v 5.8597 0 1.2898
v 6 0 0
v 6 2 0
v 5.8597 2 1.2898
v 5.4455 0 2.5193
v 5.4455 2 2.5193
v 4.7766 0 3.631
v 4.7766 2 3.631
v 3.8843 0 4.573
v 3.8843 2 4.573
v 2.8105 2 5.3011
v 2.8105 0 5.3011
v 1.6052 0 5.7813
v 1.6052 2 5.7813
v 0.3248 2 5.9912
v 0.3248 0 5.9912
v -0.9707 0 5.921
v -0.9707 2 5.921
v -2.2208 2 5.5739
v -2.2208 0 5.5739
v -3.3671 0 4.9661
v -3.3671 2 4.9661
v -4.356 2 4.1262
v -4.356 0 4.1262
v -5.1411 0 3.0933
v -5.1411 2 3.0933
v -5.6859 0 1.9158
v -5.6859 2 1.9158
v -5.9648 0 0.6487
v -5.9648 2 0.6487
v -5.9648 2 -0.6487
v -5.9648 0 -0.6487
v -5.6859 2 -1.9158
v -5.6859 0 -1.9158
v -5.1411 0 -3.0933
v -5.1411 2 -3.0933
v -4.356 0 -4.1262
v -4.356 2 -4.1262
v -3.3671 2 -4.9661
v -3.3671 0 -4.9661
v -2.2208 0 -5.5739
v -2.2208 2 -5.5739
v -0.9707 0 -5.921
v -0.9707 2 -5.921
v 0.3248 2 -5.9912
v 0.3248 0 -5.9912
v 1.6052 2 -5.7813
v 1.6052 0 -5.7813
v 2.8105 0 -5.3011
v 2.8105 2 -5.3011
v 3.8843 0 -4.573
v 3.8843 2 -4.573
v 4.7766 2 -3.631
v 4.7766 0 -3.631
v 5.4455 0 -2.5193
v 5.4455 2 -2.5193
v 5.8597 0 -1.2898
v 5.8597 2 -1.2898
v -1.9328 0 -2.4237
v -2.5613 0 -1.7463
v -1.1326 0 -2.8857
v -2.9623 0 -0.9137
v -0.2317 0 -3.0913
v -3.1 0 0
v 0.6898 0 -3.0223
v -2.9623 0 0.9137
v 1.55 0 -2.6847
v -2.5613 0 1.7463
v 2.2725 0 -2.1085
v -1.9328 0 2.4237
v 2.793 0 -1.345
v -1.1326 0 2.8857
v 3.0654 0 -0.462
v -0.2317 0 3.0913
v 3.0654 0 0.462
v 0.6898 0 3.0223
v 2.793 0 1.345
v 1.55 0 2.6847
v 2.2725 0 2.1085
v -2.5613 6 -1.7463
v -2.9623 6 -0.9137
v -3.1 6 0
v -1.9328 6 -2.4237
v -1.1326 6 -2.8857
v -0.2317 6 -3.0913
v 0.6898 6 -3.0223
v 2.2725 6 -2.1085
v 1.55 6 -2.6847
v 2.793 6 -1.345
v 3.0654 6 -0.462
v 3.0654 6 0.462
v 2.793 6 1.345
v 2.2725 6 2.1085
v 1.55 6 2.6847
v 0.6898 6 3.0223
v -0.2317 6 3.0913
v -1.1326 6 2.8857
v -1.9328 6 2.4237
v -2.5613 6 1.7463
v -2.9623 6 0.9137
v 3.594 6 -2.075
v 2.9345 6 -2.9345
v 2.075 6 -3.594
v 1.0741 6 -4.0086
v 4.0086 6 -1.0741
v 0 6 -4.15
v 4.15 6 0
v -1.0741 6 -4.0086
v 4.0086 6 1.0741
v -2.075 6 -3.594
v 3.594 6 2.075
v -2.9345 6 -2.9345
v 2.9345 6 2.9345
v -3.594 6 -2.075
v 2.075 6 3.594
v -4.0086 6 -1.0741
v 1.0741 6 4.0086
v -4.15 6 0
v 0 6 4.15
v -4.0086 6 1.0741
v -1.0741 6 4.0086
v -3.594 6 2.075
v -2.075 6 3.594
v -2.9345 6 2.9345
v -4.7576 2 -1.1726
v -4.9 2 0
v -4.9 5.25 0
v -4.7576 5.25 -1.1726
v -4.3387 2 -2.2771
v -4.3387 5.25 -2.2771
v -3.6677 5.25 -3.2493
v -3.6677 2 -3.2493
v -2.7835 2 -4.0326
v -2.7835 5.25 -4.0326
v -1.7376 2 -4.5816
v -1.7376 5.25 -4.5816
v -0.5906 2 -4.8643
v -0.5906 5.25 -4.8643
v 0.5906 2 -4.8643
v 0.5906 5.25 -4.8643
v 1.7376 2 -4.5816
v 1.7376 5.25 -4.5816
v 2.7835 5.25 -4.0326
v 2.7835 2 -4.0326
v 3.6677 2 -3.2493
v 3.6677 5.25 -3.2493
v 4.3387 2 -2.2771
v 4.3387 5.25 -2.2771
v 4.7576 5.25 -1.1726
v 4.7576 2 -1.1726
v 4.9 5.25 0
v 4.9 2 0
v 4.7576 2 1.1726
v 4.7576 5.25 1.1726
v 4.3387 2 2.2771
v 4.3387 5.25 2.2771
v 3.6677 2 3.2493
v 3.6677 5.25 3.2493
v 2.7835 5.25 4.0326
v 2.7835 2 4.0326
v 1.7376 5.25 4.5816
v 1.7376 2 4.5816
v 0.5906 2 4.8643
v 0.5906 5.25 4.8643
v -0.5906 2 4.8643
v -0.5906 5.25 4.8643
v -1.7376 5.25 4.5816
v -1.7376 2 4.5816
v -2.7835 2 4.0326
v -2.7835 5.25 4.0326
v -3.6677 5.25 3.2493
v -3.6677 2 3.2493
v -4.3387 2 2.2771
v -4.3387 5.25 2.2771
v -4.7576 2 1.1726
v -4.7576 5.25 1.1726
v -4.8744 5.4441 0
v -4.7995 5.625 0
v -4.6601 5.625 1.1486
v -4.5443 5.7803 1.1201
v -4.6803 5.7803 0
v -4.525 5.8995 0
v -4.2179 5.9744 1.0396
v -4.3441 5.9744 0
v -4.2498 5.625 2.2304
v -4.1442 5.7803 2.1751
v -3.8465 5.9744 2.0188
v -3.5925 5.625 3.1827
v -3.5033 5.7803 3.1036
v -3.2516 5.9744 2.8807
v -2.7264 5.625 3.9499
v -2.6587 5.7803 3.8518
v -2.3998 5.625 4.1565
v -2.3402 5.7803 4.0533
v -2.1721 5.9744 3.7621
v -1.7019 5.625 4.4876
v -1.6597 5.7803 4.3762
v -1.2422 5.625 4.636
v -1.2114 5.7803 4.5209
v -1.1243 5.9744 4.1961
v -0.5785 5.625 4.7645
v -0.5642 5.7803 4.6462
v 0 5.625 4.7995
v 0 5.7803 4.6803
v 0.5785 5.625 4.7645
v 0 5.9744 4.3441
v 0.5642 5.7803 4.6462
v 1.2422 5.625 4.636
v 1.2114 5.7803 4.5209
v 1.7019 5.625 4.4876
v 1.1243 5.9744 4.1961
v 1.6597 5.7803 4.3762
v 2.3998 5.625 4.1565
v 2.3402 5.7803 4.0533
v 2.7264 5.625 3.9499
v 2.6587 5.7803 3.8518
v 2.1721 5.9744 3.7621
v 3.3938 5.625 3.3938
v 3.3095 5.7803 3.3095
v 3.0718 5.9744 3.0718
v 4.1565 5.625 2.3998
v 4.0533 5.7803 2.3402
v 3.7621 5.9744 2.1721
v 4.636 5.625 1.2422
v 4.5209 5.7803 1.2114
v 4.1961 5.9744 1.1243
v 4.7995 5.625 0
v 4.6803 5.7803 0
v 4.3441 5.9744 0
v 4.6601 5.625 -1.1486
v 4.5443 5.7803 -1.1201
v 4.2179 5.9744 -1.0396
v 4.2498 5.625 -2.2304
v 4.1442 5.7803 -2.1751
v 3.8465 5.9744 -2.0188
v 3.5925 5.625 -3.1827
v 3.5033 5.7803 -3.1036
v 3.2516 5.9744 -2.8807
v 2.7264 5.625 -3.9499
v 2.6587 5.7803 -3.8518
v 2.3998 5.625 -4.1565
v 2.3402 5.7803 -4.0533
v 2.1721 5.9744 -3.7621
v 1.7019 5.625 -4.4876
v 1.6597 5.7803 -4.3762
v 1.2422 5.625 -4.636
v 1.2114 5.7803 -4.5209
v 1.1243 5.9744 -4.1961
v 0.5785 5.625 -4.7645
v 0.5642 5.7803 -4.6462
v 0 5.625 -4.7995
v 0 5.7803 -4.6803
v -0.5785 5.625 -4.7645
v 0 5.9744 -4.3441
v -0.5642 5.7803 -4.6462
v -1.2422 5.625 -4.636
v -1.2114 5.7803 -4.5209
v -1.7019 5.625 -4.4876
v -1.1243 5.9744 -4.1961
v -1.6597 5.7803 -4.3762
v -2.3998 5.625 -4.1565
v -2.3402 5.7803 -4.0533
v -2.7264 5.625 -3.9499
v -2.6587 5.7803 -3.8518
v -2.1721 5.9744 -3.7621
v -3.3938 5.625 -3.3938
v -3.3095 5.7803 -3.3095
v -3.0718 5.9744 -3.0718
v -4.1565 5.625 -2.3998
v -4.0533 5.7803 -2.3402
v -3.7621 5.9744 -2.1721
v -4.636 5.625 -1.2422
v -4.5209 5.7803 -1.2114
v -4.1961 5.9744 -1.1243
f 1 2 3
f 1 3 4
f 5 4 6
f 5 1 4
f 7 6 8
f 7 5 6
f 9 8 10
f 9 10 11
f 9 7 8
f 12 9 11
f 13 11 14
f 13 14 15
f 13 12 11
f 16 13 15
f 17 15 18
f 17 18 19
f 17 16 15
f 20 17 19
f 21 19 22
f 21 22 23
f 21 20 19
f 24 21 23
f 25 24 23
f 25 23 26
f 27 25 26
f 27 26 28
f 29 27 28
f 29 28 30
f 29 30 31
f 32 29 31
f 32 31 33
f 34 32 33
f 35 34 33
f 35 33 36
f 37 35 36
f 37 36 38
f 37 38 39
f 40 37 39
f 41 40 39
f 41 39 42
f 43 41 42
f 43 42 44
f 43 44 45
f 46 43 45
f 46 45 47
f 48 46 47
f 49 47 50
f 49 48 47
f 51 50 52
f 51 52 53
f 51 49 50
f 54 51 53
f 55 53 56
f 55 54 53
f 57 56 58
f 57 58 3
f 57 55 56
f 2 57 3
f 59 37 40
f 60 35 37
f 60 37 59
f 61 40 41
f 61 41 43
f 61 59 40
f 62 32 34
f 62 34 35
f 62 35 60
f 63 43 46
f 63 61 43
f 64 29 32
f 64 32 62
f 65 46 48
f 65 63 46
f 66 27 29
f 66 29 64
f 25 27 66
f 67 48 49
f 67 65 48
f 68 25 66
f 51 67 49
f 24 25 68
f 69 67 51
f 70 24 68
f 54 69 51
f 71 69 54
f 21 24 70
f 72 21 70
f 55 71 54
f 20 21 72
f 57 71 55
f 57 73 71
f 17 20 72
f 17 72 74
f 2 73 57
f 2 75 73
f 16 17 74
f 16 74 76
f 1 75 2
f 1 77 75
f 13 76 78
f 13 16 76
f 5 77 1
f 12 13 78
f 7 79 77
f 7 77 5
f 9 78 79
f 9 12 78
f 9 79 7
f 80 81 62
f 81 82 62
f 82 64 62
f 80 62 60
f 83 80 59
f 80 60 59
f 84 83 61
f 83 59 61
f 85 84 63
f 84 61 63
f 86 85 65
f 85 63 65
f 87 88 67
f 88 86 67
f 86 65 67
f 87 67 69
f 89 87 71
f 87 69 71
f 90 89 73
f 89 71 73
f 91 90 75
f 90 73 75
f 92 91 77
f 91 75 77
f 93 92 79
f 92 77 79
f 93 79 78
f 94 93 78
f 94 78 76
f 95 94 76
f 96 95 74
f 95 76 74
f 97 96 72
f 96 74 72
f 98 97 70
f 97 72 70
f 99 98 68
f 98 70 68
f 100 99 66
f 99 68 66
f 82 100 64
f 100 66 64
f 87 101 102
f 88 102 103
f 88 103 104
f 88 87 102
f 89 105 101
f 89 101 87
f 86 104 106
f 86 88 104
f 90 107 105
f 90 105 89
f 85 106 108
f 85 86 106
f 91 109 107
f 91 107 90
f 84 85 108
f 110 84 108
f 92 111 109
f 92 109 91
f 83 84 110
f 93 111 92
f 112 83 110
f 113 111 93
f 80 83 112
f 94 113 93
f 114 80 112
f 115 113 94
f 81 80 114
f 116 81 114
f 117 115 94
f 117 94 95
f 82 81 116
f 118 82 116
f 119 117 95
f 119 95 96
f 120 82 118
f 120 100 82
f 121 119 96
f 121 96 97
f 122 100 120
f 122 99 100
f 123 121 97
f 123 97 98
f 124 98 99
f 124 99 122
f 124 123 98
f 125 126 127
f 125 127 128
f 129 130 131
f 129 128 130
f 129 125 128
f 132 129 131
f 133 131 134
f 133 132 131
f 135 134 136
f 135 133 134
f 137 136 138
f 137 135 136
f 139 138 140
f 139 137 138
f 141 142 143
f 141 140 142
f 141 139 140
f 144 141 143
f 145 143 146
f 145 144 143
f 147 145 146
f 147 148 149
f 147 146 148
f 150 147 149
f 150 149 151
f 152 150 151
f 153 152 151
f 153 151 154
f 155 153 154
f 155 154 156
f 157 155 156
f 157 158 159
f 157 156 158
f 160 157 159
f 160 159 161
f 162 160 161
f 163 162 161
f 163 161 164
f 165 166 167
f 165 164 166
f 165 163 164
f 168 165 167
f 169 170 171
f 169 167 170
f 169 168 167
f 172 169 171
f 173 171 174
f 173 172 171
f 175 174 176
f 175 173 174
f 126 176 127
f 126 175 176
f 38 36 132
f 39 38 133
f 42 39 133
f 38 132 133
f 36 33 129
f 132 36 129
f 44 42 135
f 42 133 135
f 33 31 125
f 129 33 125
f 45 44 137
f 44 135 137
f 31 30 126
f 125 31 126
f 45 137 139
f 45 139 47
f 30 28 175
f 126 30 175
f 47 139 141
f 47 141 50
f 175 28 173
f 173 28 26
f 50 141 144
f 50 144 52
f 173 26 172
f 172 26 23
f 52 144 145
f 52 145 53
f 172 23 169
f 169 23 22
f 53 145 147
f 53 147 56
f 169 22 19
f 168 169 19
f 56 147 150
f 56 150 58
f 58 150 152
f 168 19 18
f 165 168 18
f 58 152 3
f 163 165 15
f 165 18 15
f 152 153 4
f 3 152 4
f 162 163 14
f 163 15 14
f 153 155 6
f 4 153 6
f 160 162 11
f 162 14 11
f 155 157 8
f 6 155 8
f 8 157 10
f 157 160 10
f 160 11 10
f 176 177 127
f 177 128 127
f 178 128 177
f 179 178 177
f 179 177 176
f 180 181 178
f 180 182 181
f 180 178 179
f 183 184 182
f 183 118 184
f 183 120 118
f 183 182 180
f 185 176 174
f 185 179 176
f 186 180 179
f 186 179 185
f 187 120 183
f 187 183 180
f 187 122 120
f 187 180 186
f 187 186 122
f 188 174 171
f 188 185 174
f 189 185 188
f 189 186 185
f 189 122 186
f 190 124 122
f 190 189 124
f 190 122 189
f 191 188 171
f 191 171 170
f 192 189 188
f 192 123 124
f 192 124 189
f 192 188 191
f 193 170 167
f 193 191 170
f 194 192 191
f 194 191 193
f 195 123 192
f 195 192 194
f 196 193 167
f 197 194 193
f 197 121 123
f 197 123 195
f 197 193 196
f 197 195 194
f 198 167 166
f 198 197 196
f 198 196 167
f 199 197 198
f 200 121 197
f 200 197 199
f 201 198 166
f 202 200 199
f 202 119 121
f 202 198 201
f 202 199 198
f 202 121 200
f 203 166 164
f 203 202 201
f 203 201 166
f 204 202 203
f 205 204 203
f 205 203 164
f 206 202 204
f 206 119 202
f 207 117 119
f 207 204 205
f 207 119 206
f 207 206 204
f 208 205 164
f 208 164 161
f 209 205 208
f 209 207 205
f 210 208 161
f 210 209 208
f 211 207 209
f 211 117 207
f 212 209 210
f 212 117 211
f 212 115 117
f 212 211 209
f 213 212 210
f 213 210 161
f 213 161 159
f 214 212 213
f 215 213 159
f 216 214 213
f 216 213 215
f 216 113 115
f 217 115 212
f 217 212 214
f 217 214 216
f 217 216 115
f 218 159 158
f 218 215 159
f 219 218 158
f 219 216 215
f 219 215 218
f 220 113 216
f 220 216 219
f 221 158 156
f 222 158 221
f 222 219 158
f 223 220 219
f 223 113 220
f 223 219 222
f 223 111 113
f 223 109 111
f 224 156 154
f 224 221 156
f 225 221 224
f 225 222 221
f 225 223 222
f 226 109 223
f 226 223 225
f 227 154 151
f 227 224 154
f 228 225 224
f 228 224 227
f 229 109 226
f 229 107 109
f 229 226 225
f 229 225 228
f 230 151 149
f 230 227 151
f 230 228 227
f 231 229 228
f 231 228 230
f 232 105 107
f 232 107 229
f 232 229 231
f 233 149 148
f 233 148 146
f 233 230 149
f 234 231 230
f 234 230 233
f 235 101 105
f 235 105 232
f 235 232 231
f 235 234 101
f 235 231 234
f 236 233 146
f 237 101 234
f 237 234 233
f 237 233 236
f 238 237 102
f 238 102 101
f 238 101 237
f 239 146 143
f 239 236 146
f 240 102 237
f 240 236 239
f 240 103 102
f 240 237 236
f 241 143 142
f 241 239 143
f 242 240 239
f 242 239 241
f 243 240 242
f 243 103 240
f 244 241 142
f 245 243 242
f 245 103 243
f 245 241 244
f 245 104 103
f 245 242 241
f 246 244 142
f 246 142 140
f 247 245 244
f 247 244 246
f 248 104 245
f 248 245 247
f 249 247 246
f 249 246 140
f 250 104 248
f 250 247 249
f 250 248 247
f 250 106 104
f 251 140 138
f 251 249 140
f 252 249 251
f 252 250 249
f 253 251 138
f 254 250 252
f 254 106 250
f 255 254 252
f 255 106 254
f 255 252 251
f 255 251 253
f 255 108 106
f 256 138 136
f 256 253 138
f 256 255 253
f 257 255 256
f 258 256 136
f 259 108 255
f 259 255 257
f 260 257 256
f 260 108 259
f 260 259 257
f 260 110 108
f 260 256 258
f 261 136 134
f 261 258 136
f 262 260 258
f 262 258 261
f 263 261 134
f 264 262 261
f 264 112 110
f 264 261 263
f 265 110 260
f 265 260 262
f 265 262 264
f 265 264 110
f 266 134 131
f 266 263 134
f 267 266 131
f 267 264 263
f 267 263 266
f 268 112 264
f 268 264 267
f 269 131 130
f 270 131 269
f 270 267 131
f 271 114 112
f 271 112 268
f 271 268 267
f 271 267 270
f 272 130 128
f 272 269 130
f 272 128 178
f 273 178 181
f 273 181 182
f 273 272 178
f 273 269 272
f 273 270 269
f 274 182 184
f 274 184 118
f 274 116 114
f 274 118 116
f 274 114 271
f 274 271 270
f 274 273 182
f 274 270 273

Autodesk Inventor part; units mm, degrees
ref_plane "YZ Plane" through (0, 0, 0) normal (1, 0, 0) x (0, 1, 0)
ref_plane "XZ Plane" through (0, 0, 0) normal (0, 1, 0) x (-1, 0, 0)
ref_plane "XY Plane" through (0, 0, 0) normal (0, 0, 1) x (1, 0, 0)
sketch "Sketch1" plane through (0, 0, 0) normal (0, 1, 0) x (-1, 0, 0)
  circle A0 centre (0, 0) radius 4.9
  circle A1 centre (0, 0) radius 3.1
  dimension "d0" = 9.8
  dimension "d1" = 6.2
extrude "Extrusion1" add sketch "Sketch1" along normal blind 6
sketch "Sketch2" plane through (0, 0, 0) normal (0, -1, 0) x (1, 0, 0)
  circle A0 centre (0, 0) radius 6
  circle A1 centre (0, 0) radius 4.9 projected
  circle A2 centre (0, 0) radius 3.1 projected
  dimension "d4" = 12
extrude "Extrusion2" add sketch "Sketch2" against normal blind 2 contours A0
fillet "Fillet1" radius 0.75 1 edges at (4.9, 6, 0)
properties part number "bøsning_beslag_3D" material "Brass, Soft Yellow"
